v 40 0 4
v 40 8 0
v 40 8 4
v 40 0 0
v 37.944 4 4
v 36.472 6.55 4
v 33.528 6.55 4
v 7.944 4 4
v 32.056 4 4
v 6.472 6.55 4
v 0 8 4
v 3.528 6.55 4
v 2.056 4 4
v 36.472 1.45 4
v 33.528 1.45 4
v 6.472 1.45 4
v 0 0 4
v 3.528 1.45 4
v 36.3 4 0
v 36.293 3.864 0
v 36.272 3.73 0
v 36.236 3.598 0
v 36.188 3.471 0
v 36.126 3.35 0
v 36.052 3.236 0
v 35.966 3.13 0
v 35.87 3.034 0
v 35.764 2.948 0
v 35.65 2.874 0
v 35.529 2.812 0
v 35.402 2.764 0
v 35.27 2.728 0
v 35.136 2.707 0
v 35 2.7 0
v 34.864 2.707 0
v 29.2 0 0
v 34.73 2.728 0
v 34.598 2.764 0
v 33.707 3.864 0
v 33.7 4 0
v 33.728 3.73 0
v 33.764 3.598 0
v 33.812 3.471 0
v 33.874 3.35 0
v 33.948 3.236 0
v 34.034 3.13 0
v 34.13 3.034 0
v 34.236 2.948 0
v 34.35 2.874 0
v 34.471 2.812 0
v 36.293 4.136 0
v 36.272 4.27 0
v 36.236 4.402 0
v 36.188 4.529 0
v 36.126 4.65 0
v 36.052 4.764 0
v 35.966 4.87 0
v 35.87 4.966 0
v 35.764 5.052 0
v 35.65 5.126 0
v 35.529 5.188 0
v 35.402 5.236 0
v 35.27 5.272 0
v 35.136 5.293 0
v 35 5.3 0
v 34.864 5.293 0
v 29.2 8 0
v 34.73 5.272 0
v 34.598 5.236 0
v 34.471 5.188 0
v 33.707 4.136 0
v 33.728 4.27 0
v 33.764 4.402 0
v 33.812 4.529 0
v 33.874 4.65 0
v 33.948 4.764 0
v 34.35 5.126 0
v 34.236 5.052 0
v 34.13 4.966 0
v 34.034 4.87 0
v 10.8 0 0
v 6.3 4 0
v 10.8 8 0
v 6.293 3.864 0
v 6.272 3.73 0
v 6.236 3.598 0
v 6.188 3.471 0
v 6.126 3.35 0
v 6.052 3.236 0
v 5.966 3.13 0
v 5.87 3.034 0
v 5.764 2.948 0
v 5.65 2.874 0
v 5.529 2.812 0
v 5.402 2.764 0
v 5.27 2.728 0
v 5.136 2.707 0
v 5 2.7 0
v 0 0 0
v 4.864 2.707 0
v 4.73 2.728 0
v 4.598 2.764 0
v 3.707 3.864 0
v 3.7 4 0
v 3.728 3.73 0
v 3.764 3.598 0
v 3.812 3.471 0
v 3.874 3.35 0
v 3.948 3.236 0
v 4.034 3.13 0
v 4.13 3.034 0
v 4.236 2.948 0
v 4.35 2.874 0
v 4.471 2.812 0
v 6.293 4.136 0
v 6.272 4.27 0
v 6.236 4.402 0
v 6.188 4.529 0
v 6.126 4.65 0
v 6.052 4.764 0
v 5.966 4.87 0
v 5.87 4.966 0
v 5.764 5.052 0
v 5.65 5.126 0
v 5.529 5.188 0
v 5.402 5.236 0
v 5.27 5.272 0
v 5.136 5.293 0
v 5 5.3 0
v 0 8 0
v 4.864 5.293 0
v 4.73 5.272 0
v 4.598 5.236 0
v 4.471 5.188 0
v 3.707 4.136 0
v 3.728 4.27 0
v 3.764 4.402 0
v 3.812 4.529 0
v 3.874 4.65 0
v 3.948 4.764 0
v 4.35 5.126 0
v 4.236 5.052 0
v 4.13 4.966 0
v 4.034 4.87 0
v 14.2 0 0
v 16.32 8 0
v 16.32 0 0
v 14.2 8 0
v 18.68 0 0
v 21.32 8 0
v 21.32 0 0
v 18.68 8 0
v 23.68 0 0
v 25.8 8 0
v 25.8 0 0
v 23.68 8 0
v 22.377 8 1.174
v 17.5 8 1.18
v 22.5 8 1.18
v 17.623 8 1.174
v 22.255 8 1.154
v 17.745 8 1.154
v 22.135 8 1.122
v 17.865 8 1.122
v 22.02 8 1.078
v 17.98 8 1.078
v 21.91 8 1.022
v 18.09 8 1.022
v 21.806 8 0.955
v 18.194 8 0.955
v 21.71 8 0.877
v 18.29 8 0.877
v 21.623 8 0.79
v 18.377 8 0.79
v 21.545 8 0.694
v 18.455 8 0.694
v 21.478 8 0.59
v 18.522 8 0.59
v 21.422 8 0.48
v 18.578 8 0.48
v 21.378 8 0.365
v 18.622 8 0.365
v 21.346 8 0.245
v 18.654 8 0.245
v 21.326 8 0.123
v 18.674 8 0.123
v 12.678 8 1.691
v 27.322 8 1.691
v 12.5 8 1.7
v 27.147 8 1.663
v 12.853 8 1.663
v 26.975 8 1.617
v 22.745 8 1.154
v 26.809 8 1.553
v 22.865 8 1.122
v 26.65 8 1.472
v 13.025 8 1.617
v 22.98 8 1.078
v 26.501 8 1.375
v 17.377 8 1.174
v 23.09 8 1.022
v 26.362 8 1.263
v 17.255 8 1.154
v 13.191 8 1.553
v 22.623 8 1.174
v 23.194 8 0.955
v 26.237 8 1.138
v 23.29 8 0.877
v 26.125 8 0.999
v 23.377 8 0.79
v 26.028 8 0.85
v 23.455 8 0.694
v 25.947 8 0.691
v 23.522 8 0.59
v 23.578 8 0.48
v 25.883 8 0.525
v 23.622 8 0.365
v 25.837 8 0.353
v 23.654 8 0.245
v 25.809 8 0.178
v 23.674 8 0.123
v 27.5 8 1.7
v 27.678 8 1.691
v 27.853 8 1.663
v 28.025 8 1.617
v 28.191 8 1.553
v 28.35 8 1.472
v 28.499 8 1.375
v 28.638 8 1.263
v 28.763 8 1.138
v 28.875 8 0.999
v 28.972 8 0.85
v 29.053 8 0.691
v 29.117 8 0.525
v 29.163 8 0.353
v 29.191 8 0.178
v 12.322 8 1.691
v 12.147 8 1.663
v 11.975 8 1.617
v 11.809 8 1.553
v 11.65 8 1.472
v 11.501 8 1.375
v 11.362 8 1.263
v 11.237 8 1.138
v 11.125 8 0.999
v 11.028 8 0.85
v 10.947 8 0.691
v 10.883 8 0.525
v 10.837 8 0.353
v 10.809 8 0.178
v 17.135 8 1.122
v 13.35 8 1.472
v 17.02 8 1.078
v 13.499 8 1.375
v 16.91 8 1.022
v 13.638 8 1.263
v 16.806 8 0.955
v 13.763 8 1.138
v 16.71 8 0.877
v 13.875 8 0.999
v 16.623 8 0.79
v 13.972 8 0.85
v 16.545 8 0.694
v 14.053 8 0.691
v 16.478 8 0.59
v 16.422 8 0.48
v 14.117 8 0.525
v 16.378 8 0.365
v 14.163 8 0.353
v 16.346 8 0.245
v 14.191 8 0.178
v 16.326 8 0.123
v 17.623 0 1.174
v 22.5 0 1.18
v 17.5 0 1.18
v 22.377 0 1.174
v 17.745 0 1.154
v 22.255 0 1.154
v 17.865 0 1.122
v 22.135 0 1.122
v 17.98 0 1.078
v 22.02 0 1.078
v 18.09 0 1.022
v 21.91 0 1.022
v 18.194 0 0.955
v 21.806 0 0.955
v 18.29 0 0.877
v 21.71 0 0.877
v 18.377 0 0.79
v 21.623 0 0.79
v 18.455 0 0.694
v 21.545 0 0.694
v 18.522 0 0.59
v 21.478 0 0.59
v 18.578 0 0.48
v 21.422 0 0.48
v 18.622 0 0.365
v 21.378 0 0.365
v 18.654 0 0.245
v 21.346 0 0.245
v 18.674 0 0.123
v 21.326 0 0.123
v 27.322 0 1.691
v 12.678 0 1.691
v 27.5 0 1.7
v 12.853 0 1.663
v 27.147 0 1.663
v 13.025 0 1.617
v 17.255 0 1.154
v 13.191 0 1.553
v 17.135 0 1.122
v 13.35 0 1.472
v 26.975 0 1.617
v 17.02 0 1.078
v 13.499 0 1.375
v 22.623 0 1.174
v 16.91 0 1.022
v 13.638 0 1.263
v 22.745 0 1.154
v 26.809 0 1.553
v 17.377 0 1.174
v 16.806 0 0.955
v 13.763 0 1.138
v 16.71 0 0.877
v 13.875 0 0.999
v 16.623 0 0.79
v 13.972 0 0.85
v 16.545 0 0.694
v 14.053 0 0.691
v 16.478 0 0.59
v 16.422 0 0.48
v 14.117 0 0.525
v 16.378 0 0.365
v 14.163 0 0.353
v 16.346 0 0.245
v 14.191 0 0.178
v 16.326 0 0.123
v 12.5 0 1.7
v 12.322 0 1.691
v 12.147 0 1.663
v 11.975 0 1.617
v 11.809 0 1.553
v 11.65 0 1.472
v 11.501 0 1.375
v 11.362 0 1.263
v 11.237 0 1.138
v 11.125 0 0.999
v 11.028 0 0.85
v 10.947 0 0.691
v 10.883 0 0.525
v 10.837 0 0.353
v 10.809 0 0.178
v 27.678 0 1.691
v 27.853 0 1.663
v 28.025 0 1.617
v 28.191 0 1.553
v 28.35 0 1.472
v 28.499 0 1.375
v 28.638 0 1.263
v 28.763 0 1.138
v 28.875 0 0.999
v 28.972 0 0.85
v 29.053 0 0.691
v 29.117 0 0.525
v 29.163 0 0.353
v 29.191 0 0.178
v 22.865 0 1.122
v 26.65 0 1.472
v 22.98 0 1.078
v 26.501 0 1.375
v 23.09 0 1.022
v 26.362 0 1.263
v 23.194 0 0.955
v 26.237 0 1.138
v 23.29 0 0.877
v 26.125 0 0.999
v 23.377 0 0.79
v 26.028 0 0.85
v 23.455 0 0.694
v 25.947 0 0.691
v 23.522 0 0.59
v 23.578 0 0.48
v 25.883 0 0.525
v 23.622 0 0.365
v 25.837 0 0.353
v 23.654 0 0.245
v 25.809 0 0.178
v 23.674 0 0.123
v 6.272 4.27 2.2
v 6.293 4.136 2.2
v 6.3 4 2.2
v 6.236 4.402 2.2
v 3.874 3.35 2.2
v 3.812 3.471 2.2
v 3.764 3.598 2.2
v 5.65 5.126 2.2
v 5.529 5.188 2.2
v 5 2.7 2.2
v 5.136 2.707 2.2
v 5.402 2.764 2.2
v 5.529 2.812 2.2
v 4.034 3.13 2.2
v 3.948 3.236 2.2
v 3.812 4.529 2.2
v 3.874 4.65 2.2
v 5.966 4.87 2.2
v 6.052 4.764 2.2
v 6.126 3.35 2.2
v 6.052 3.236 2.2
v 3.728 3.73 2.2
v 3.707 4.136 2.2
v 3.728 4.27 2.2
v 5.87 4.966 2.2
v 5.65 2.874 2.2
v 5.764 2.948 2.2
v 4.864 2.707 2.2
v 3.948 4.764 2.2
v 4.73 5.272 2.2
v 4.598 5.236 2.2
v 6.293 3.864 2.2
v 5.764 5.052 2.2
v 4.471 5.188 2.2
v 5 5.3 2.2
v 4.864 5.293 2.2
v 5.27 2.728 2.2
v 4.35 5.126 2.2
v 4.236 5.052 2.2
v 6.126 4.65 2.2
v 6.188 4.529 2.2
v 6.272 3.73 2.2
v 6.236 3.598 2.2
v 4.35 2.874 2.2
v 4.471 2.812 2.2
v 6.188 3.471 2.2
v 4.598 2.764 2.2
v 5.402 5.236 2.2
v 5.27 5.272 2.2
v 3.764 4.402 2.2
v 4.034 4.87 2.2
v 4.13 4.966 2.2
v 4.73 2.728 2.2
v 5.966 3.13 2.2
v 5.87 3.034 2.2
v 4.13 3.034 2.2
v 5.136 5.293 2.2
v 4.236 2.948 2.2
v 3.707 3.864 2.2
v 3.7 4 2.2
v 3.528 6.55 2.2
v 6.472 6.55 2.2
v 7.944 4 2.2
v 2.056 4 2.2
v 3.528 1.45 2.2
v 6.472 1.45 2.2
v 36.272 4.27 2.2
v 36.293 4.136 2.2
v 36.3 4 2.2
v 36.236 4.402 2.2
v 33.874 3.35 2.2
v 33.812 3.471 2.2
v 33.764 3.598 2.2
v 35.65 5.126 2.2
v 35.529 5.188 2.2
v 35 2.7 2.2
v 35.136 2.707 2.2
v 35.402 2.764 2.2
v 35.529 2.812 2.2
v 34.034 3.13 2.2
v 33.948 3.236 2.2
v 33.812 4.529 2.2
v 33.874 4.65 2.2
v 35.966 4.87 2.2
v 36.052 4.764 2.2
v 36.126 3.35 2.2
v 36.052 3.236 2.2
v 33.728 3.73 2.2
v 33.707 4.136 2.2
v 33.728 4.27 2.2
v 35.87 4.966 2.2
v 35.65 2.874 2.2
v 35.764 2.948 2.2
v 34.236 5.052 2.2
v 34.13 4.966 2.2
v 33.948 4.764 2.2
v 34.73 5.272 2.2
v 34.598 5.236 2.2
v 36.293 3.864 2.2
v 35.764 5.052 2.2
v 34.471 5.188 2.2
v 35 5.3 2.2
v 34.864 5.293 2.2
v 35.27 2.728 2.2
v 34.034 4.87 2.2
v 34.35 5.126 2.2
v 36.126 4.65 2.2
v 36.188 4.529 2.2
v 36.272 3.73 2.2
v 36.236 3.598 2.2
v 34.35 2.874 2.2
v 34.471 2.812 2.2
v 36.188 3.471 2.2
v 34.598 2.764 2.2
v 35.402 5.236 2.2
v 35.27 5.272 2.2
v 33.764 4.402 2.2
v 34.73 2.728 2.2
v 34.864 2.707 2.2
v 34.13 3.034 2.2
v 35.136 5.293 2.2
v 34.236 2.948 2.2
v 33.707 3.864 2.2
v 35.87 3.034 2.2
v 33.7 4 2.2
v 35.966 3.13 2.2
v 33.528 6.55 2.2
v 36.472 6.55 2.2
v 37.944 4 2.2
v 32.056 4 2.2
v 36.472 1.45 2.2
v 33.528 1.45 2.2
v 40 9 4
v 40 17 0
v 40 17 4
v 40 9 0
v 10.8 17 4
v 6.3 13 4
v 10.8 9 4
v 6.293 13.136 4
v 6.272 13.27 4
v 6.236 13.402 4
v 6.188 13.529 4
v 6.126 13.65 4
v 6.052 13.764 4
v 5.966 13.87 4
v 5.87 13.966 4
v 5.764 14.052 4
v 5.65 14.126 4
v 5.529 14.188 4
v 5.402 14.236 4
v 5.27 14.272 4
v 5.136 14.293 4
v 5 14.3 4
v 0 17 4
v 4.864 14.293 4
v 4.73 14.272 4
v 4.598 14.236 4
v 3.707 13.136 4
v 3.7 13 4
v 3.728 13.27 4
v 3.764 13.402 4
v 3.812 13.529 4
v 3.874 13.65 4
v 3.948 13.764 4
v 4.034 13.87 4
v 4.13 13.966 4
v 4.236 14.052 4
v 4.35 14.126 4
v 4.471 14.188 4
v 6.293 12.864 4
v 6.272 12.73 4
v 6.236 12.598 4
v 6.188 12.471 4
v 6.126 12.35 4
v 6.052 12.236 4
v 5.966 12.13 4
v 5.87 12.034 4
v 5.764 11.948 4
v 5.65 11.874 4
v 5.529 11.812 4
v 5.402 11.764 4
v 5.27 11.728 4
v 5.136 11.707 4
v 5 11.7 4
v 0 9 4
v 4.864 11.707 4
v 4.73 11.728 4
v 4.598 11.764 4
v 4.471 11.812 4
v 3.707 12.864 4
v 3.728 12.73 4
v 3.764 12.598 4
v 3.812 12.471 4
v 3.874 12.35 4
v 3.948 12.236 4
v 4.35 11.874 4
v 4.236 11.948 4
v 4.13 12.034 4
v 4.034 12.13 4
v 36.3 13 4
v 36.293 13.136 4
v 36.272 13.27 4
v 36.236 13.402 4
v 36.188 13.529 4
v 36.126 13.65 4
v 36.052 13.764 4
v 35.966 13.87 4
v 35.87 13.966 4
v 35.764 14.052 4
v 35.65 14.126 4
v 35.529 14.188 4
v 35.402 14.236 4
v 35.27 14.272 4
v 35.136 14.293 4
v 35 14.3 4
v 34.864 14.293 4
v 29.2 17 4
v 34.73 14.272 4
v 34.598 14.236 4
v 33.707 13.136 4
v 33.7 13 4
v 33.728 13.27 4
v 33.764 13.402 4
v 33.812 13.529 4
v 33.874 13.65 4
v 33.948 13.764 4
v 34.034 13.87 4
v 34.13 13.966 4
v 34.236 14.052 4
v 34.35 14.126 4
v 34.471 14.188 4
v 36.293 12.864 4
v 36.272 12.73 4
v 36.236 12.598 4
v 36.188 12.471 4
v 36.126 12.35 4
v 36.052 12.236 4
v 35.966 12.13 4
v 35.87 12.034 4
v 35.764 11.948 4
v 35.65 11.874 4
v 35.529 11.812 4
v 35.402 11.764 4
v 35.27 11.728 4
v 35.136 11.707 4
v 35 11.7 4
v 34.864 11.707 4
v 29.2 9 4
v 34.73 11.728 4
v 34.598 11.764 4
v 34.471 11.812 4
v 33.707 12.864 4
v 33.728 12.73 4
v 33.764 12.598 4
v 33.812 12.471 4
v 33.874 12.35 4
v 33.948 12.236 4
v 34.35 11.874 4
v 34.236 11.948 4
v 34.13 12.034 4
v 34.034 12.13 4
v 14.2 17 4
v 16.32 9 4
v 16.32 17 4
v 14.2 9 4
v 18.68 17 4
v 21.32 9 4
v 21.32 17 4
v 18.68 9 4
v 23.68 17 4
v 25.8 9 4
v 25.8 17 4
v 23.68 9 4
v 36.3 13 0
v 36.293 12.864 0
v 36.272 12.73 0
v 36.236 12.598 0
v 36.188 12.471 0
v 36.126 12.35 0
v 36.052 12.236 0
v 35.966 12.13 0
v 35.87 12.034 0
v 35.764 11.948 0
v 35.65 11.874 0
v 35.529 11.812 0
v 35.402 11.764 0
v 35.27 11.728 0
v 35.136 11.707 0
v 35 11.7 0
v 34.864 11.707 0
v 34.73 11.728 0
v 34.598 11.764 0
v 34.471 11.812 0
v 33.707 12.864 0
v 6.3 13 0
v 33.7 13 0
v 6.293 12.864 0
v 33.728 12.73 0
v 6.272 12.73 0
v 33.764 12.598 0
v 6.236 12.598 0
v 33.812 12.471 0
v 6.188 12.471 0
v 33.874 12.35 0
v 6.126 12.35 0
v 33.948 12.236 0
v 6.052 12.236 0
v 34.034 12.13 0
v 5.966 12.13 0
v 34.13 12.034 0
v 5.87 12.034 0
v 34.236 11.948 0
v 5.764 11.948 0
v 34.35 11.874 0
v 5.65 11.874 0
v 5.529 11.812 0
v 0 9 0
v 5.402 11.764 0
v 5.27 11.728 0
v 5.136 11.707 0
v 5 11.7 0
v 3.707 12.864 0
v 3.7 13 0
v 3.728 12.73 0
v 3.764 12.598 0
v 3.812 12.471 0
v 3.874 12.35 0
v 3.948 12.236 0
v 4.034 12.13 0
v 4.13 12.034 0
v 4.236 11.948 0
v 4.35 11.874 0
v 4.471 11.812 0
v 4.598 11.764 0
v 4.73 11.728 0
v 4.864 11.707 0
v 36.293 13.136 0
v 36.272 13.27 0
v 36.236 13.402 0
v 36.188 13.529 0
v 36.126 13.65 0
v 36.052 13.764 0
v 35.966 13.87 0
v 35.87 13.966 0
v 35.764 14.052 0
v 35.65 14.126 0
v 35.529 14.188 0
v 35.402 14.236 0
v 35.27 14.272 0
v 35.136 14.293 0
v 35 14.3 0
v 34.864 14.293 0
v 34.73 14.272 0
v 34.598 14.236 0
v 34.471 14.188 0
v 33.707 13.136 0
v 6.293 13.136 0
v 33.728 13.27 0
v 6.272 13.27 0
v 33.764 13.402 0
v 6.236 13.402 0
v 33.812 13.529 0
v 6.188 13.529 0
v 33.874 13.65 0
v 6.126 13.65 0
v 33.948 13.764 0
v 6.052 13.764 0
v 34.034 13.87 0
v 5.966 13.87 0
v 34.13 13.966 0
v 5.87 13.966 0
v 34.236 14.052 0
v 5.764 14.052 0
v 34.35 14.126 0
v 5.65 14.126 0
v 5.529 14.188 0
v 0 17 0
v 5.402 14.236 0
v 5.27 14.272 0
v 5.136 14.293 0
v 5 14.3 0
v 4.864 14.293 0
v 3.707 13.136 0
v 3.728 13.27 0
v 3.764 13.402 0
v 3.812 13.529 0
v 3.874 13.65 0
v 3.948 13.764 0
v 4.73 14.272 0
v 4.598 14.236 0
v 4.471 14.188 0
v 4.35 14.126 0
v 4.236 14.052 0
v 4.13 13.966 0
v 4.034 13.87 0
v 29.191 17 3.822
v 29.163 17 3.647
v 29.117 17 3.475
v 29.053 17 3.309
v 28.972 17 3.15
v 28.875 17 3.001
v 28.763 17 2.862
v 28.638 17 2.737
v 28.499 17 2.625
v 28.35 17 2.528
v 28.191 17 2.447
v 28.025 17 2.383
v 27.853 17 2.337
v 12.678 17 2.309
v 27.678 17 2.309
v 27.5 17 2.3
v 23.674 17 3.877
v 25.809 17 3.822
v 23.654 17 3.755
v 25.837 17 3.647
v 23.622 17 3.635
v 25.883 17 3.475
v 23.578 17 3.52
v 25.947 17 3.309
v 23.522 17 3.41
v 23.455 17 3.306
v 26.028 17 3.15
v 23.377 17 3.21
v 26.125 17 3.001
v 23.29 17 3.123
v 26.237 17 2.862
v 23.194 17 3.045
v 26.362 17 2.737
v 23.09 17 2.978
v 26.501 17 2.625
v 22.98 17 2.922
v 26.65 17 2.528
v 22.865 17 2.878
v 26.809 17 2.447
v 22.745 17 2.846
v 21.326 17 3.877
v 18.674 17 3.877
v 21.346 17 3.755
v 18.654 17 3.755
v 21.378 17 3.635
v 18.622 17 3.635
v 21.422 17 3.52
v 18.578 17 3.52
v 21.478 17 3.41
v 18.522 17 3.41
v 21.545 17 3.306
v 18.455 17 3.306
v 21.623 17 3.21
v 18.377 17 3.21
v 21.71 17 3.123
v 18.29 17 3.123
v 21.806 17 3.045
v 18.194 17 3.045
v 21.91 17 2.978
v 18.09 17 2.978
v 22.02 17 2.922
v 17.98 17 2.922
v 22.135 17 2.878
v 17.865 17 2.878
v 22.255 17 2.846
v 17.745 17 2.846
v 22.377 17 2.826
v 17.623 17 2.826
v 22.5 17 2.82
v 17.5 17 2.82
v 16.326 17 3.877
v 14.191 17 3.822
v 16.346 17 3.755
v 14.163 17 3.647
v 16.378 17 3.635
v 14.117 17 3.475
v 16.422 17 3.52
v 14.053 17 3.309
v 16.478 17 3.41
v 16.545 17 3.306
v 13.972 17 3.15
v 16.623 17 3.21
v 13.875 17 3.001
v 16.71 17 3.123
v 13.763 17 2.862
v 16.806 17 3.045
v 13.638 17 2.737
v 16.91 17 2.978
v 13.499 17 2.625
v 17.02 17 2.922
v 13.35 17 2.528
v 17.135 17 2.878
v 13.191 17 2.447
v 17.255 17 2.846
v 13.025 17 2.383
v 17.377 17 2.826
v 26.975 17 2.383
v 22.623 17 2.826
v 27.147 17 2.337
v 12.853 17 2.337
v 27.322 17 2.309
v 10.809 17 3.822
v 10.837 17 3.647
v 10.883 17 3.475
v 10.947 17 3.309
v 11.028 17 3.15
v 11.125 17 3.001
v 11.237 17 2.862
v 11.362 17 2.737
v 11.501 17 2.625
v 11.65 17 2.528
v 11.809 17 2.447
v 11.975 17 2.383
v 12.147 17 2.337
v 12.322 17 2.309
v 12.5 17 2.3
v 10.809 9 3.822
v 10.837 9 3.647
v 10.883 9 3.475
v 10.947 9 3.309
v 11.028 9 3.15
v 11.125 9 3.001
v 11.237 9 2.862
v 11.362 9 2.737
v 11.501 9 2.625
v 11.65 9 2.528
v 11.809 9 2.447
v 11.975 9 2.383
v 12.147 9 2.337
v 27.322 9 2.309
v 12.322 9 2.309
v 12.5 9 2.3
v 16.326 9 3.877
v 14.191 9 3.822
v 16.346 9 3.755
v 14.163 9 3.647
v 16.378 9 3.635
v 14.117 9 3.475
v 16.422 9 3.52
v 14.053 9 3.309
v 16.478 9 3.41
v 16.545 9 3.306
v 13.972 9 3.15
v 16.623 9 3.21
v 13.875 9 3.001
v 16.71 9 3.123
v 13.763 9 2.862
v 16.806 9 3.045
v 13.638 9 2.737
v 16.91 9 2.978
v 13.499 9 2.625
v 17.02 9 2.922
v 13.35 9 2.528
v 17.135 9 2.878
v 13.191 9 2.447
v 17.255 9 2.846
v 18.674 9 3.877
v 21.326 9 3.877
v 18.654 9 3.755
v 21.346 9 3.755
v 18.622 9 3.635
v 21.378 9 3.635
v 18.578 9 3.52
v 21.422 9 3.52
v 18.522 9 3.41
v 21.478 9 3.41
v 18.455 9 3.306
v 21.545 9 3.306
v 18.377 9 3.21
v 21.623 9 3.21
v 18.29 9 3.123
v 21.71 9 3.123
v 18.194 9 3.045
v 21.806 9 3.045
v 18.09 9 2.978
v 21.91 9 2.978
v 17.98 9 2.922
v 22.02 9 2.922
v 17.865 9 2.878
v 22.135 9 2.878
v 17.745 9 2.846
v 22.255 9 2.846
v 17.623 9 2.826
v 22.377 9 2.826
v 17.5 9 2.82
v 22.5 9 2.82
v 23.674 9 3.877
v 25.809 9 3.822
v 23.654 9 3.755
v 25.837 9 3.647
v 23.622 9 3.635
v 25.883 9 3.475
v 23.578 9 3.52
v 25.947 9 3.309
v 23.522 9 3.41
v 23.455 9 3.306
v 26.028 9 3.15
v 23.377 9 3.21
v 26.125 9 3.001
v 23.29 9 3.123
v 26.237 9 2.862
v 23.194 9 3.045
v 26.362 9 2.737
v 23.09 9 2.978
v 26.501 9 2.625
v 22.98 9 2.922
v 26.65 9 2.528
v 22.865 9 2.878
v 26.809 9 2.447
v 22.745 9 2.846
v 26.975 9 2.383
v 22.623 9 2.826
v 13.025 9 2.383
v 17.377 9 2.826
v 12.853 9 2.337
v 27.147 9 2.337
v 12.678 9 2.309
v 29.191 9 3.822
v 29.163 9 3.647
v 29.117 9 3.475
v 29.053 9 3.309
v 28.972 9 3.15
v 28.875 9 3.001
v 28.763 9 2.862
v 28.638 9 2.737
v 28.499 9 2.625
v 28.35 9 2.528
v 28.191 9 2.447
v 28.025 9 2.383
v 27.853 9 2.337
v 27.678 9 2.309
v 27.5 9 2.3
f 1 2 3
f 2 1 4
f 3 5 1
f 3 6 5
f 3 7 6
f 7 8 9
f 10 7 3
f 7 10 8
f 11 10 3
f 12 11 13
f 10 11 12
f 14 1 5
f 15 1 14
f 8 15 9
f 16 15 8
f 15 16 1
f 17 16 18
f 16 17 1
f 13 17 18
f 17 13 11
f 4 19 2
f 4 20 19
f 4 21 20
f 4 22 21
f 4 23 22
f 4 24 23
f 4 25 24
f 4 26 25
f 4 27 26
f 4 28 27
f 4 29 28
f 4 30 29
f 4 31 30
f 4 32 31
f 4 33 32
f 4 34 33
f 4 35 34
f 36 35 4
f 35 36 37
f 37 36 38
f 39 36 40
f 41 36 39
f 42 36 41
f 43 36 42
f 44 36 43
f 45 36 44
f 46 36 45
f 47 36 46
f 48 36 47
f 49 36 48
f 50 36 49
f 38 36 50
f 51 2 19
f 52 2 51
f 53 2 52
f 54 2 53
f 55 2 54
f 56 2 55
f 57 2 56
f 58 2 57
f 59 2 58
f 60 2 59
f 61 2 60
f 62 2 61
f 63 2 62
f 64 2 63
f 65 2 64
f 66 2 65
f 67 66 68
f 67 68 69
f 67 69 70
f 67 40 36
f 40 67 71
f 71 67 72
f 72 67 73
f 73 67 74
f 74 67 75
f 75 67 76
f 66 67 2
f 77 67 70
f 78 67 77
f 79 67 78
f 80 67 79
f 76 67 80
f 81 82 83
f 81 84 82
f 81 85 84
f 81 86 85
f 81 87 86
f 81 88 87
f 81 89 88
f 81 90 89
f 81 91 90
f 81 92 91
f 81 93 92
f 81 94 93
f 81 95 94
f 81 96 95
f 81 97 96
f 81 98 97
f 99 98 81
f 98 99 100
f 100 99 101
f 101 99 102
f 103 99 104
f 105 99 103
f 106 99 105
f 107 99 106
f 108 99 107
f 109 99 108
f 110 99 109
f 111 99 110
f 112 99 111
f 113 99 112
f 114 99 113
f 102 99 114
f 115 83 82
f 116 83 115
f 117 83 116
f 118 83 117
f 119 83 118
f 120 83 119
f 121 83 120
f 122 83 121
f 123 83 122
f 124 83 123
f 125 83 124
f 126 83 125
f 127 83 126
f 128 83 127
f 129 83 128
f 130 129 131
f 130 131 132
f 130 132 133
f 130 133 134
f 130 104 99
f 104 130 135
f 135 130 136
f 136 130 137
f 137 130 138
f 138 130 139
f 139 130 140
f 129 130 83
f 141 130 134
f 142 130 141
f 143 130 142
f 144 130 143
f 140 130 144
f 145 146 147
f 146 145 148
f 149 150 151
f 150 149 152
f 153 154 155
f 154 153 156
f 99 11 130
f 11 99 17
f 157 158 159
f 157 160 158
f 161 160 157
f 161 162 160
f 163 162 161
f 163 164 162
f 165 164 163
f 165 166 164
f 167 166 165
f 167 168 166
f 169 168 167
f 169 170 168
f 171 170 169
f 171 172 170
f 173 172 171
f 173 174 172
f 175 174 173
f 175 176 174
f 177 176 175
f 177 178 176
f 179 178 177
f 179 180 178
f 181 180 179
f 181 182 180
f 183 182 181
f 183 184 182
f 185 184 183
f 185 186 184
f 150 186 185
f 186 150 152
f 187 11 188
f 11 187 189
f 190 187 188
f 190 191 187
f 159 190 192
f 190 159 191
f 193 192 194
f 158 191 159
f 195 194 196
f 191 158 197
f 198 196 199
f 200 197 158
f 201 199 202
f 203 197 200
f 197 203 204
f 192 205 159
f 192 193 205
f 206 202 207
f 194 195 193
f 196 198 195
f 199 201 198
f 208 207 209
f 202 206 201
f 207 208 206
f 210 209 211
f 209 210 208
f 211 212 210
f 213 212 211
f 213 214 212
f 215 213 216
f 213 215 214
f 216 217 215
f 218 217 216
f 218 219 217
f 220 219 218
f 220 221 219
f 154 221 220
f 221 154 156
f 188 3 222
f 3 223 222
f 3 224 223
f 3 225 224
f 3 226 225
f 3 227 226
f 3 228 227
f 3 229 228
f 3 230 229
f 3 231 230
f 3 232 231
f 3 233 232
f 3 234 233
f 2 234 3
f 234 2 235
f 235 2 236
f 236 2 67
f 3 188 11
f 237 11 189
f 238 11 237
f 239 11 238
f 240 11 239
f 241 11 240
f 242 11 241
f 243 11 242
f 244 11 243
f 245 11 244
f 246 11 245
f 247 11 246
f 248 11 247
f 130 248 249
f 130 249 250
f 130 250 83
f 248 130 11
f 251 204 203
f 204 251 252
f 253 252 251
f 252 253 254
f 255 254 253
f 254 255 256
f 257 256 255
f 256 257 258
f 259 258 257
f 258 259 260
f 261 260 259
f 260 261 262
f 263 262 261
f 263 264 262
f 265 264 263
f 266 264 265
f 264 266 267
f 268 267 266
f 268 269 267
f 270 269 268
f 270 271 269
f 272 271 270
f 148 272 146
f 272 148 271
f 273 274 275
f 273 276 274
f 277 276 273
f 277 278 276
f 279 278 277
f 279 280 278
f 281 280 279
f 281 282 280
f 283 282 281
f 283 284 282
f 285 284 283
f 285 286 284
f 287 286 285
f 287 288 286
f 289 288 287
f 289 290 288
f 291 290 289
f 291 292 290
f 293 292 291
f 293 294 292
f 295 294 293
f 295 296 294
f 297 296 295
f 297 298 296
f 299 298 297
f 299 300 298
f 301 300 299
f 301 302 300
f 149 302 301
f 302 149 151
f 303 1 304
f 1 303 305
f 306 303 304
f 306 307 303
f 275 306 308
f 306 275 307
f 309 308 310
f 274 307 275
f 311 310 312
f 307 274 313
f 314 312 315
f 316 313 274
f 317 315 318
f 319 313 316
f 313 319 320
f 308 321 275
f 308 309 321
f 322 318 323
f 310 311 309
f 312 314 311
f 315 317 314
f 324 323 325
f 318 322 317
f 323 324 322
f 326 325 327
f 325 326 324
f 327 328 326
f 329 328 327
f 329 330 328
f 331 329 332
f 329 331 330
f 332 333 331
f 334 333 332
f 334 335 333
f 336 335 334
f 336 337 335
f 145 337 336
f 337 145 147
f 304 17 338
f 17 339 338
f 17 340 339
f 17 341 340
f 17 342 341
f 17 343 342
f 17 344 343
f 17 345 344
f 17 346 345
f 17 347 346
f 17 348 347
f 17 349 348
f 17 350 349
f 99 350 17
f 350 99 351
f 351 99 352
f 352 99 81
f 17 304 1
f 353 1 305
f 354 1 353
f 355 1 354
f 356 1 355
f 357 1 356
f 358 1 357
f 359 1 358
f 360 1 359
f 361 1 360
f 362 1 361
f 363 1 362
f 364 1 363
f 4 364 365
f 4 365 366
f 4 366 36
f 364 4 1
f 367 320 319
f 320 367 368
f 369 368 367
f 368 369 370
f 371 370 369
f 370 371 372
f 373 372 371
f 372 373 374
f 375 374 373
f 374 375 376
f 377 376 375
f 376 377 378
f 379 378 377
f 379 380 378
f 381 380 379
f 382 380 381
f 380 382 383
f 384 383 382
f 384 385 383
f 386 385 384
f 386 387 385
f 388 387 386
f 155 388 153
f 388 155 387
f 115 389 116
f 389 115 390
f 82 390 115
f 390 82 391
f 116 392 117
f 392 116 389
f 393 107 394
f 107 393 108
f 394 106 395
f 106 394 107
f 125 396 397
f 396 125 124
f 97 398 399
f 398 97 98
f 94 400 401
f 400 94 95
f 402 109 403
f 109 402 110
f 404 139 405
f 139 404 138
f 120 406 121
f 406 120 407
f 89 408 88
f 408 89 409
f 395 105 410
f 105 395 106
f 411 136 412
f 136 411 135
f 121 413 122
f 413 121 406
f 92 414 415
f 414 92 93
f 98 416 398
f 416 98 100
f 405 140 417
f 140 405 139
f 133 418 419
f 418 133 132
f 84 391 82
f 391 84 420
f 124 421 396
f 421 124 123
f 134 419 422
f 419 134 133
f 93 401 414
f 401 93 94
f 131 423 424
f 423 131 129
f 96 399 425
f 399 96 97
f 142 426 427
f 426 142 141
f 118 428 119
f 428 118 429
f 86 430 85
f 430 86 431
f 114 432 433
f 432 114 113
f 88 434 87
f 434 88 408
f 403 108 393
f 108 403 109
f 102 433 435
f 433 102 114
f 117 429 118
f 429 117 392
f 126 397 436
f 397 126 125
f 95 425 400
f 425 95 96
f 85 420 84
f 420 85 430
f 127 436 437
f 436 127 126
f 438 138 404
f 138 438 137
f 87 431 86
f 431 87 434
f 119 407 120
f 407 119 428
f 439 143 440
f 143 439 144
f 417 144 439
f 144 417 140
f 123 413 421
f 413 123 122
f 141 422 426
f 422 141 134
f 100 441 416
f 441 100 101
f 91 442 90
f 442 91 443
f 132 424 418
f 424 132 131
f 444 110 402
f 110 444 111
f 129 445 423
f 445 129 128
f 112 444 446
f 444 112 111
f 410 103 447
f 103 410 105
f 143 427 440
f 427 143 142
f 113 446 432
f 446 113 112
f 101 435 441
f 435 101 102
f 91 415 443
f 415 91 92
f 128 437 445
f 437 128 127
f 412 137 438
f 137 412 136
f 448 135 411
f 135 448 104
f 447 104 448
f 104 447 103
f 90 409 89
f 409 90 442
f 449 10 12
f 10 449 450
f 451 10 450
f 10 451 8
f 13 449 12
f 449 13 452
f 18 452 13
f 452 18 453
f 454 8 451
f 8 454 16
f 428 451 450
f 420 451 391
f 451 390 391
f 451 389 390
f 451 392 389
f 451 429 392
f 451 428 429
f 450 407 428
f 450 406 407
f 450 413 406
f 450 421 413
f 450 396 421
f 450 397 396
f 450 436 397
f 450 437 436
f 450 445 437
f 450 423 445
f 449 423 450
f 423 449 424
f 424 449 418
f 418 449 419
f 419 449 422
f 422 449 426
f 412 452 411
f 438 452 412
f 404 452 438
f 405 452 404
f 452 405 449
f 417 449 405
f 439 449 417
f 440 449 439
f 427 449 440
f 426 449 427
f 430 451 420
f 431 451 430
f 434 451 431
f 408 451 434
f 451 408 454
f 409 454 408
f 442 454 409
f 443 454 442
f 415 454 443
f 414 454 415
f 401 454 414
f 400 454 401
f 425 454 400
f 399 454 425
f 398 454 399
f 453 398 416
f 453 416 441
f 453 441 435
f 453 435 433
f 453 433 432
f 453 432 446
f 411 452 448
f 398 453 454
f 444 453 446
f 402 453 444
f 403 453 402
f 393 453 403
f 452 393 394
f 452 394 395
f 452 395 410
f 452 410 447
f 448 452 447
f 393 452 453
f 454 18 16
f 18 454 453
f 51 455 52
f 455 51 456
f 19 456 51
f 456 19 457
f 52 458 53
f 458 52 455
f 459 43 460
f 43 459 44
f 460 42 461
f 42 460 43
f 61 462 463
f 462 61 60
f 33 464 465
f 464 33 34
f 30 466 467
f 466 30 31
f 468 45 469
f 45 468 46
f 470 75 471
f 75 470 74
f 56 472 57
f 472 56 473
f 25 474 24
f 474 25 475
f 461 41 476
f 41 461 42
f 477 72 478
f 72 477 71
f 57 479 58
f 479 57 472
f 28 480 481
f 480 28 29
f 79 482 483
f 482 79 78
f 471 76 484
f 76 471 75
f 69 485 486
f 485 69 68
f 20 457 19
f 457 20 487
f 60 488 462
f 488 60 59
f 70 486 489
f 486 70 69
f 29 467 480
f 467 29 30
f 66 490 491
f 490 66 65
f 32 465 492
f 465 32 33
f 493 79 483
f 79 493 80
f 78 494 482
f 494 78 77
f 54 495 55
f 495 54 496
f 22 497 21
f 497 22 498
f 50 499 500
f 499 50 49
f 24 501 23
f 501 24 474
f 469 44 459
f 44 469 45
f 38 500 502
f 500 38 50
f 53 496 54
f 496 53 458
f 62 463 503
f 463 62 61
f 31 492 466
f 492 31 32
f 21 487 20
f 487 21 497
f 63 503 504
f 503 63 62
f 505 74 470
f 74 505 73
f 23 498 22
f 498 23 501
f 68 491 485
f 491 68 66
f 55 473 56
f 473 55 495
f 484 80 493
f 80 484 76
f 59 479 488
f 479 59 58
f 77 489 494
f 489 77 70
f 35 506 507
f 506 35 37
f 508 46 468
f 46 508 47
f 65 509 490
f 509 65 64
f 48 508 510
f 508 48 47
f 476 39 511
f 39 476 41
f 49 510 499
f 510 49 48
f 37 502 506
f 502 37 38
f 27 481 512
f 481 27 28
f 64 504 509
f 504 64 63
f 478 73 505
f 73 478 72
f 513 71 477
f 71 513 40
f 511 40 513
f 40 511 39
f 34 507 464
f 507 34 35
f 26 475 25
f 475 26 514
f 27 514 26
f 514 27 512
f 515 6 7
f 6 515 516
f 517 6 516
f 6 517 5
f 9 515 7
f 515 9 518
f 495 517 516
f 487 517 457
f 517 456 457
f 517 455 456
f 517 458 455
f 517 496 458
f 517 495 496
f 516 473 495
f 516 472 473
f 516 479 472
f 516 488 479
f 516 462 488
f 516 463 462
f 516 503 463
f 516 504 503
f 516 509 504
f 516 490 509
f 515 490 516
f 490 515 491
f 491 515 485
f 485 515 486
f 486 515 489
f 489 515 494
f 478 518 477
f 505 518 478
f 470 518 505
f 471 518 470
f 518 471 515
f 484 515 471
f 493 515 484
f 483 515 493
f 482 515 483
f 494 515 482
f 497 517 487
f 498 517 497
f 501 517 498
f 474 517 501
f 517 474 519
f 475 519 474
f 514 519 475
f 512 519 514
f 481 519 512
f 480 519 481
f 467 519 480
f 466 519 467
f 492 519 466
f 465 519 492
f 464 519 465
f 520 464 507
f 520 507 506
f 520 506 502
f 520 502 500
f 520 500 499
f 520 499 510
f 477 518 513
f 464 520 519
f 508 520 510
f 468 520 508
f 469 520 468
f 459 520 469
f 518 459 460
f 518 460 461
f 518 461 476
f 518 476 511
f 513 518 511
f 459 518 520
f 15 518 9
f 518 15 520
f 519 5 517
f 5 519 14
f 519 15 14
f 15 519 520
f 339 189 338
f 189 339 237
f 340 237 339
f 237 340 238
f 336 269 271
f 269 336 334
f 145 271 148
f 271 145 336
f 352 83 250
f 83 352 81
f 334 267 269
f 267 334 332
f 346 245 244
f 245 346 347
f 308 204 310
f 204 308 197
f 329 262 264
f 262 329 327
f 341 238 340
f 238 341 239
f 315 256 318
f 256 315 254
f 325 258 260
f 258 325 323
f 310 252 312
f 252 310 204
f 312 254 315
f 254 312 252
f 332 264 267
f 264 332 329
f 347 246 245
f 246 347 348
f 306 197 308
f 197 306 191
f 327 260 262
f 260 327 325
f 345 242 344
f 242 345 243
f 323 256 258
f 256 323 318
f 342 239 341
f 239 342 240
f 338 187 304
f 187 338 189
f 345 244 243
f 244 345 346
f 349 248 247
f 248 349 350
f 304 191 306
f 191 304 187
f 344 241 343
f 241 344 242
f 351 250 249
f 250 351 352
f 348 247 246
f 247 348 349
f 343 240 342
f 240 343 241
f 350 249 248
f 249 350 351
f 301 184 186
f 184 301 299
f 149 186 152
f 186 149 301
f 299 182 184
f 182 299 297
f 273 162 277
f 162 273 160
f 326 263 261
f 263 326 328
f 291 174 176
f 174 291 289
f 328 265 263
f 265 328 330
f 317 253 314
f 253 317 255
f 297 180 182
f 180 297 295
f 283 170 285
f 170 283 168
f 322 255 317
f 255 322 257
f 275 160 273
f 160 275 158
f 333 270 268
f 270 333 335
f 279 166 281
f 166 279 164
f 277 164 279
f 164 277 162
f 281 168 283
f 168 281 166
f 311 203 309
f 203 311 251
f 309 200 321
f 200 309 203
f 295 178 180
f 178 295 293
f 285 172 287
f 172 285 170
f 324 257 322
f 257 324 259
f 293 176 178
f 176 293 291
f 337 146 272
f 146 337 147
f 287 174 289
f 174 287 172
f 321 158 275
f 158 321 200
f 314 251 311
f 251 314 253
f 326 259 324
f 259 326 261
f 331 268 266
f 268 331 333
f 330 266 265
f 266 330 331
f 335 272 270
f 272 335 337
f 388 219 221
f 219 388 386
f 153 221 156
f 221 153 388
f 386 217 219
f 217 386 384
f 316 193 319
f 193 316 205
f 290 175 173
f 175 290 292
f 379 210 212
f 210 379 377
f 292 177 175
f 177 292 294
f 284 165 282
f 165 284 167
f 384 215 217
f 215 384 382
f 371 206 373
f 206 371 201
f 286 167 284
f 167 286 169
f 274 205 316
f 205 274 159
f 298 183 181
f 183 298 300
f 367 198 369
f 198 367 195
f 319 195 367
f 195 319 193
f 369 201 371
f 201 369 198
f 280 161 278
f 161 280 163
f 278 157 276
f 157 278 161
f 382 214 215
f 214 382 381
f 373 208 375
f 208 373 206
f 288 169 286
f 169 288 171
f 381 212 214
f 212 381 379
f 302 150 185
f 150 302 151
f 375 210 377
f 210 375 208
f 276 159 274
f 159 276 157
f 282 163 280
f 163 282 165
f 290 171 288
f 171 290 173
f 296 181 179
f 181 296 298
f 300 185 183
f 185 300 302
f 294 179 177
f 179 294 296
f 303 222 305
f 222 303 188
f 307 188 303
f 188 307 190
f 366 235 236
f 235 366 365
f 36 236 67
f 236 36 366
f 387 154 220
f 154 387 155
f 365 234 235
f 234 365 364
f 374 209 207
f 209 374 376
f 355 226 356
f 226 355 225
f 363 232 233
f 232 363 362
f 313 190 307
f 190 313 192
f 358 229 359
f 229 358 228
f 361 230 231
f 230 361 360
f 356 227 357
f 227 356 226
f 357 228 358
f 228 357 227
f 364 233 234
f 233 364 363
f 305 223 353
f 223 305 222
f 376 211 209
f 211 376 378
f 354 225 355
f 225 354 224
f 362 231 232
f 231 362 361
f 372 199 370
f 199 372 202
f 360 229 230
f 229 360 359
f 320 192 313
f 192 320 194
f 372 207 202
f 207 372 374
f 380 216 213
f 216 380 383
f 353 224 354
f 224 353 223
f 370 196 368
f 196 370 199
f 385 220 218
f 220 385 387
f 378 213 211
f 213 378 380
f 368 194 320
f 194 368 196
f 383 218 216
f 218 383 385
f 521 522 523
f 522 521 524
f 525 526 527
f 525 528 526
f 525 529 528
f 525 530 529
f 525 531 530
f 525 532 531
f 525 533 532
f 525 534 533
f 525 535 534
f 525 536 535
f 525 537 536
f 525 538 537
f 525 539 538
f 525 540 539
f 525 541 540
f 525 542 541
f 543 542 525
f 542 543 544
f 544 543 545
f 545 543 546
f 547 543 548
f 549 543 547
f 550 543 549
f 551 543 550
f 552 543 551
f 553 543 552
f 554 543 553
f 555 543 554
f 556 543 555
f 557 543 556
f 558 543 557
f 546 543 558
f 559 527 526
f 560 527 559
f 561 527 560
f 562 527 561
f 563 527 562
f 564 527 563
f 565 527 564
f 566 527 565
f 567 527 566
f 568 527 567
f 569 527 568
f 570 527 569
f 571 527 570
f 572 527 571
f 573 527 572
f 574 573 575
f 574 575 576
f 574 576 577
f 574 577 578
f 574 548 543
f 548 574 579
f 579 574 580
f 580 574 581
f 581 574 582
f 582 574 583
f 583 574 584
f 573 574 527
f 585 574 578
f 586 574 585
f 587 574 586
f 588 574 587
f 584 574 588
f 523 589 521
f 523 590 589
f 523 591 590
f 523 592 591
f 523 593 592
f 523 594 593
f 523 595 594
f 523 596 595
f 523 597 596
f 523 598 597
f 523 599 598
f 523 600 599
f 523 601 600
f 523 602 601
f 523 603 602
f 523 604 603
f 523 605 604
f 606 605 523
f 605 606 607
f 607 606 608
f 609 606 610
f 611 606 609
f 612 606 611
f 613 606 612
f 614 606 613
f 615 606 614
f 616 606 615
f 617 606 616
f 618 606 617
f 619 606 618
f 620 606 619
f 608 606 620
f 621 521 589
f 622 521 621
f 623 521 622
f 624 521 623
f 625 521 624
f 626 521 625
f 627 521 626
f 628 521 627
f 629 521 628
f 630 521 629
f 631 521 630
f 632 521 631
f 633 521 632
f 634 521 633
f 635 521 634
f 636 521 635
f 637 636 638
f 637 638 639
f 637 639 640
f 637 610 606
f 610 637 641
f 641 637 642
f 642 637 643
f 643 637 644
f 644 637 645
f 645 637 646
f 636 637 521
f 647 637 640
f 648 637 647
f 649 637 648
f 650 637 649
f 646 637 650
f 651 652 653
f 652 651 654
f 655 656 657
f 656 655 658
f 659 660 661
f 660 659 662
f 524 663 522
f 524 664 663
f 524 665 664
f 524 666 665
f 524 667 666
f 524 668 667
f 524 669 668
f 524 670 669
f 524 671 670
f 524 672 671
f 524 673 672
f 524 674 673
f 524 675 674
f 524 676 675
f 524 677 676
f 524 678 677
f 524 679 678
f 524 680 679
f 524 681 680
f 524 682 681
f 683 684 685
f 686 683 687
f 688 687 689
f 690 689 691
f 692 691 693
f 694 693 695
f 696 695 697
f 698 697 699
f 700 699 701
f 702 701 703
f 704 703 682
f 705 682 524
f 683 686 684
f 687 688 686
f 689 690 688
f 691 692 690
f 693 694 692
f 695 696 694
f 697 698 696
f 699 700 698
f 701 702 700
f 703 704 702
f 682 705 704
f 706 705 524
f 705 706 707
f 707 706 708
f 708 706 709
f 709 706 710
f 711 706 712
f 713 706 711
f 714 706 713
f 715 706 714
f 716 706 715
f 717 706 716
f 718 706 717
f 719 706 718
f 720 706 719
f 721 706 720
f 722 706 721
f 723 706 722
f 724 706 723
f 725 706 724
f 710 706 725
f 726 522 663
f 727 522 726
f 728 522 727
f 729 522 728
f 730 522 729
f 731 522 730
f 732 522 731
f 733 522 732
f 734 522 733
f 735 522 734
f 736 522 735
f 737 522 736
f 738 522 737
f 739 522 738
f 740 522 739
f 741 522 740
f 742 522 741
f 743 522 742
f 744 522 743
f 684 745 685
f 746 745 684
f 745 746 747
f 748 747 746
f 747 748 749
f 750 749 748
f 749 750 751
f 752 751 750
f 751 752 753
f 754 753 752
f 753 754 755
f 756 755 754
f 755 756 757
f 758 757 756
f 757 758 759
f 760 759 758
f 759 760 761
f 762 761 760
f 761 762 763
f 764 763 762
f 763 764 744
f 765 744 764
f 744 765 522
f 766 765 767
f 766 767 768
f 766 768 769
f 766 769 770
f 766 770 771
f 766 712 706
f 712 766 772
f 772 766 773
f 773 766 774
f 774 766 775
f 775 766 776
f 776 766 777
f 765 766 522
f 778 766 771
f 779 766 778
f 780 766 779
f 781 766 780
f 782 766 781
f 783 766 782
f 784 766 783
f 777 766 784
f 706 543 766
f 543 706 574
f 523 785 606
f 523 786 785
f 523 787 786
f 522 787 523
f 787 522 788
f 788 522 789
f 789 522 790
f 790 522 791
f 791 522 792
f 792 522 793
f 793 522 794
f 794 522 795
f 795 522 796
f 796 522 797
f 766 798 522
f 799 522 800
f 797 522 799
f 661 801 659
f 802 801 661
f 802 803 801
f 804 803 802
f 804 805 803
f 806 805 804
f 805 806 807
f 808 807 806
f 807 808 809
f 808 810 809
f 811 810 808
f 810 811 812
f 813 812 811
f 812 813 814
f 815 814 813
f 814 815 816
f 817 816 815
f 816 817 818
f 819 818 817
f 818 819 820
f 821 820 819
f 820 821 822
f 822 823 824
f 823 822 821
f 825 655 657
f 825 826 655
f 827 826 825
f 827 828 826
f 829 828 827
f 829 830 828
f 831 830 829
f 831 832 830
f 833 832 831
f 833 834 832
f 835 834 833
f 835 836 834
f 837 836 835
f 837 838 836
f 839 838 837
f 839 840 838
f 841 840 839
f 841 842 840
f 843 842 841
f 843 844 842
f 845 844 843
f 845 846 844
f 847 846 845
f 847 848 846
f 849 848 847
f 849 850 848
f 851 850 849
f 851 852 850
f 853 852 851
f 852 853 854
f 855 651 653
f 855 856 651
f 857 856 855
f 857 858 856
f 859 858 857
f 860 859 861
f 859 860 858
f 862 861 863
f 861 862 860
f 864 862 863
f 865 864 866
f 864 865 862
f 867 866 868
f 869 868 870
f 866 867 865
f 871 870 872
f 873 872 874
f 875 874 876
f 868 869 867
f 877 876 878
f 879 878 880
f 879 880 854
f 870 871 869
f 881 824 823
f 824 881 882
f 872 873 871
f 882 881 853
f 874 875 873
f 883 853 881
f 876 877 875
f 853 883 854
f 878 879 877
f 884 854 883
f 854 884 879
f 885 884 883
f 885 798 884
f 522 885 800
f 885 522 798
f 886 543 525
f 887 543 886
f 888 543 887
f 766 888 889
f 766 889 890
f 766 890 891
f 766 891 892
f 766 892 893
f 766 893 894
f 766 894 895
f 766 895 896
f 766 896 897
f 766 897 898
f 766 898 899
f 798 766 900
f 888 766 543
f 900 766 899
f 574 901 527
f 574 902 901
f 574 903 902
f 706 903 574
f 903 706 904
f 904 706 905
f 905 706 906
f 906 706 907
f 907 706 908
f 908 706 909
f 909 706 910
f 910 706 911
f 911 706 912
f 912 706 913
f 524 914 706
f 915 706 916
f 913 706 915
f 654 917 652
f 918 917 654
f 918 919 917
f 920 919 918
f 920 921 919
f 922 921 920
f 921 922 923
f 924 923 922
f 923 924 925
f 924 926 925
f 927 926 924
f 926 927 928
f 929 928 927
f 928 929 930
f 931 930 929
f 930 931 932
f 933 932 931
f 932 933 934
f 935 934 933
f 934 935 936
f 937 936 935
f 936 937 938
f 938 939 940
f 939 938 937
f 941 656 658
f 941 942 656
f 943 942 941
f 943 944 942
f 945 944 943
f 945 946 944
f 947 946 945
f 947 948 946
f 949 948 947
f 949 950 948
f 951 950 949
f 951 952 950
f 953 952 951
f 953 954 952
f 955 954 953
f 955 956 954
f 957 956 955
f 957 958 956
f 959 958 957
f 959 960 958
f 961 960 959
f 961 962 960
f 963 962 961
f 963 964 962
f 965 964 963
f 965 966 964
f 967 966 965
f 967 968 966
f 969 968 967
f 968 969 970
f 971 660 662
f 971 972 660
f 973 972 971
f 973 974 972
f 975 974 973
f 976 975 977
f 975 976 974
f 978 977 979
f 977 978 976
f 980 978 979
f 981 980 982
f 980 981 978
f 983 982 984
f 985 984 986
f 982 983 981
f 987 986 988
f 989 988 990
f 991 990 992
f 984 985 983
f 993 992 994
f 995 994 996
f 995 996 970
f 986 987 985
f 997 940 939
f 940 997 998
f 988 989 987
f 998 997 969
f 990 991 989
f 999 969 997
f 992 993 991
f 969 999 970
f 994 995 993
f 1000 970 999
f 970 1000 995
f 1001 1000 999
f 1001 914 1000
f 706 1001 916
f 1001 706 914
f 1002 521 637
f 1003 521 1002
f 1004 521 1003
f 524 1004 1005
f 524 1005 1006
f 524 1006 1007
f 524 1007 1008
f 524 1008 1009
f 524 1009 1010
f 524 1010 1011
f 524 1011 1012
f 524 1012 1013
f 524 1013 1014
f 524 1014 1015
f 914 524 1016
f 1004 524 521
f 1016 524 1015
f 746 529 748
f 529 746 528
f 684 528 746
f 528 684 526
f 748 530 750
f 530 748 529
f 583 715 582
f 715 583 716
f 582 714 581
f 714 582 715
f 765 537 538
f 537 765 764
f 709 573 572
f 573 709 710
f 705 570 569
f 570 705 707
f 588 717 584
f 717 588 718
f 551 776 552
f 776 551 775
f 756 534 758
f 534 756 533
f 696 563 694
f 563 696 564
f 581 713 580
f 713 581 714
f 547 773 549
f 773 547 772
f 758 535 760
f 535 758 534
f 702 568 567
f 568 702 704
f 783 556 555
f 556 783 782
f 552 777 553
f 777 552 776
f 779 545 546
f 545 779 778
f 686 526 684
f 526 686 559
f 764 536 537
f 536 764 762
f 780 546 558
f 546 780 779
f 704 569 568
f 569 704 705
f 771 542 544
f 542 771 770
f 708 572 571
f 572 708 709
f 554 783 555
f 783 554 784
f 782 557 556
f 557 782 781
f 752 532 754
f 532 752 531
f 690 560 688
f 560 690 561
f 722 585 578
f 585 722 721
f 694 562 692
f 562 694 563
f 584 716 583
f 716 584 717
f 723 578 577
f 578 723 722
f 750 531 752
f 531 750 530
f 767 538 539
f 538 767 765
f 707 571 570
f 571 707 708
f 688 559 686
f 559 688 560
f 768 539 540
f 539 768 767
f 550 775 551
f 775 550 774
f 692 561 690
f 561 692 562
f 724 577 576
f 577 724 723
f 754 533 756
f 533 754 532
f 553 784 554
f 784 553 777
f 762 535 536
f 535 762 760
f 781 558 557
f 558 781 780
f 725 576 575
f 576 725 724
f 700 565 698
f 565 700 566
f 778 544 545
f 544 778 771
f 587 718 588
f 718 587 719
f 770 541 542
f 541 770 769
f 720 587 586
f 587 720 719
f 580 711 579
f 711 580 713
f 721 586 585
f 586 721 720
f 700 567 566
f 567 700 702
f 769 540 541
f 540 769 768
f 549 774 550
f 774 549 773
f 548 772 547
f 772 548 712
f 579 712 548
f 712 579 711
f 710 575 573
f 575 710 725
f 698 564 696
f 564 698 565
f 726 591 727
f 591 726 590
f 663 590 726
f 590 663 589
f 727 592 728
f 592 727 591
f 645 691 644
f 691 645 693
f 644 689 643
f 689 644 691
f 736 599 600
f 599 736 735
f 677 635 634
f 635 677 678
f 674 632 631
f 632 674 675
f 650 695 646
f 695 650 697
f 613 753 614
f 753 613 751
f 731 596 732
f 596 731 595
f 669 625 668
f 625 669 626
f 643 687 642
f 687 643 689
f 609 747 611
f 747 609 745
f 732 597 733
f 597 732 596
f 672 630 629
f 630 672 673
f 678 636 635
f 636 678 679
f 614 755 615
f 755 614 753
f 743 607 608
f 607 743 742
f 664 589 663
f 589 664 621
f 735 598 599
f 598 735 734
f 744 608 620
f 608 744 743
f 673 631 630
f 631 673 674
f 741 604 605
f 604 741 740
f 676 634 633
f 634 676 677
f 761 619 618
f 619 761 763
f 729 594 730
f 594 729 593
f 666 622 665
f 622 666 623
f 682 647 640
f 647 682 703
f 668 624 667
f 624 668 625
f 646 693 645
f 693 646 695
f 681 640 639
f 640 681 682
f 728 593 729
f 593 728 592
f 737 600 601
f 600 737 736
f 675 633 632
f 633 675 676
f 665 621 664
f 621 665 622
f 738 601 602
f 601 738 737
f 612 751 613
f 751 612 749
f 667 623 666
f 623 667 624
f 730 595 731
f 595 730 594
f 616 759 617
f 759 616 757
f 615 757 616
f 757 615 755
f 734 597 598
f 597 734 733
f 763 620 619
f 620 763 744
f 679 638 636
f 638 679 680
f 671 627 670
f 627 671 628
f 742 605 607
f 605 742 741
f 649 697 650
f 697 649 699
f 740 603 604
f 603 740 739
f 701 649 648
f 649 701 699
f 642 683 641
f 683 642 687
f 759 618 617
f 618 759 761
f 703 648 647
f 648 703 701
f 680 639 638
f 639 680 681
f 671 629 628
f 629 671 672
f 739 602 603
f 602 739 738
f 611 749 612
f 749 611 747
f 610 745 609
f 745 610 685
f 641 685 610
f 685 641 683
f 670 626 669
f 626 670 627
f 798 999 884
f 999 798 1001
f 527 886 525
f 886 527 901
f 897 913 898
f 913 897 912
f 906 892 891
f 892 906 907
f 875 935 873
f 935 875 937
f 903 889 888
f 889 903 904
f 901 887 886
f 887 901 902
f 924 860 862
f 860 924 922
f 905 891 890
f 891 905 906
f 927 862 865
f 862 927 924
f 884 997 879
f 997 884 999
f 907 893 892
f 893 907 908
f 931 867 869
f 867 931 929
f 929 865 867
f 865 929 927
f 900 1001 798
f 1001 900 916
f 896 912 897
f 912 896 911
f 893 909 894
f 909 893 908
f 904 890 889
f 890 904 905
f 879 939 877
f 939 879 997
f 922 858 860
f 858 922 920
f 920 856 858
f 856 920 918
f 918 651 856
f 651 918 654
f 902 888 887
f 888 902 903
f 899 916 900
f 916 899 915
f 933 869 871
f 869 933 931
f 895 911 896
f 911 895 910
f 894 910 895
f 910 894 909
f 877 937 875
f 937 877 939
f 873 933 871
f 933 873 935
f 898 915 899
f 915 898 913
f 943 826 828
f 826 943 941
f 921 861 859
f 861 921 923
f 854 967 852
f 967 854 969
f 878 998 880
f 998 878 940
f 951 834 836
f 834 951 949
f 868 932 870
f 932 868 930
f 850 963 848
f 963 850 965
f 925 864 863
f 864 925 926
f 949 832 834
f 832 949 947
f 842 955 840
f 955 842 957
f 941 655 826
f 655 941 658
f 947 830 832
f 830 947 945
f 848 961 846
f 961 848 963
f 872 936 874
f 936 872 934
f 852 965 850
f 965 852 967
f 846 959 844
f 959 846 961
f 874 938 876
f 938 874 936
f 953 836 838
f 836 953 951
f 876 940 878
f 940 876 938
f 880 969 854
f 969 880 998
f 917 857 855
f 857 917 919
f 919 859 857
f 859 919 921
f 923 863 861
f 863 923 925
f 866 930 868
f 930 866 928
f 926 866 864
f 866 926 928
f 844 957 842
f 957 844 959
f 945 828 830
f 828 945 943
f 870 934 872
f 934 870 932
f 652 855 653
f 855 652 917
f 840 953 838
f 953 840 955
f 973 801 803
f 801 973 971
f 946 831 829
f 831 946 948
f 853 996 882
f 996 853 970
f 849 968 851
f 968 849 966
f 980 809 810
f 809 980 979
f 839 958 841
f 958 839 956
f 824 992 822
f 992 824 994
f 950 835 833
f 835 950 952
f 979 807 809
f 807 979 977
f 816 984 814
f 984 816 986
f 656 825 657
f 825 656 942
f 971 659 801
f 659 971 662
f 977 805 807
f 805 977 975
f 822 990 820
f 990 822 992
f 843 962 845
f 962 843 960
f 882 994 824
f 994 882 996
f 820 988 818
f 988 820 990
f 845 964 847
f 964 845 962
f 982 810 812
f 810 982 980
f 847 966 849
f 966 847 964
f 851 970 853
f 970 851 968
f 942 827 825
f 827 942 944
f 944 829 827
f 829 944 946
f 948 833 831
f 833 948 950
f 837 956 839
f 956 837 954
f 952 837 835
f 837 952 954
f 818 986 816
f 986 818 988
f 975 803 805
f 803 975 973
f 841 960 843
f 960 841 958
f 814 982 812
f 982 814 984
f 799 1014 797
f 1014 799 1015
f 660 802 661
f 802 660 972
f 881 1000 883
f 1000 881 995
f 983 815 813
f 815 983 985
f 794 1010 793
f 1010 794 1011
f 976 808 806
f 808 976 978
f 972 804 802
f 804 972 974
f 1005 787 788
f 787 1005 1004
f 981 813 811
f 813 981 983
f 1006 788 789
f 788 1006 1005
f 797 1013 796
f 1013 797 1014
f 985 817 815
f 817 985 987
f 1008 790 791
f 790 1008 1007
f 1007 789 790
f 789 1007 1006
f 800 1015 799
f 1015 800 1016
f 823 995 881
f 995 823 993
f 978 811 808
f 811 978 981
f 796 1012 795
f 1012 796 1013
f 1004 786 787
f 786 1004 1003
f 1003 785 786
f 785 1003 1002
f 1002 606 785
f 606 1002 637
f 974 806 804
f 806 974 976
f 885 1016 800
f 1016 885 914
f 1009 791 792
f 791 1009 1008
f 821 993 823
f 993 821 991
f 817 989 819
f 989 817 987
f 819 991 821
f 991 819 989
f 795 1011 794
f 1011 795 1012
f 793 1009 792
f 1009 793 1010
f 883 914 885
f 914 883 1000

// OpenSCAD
// Copyright 2023 Heikki Suonsivu
// Licensed under Creative Commons CC-BY-NC-SA, see https://creativecommons.org/licenses/by-nc-sa/4.0/
// For commercial licensing, please contact directly, hsu-3d@suonsivu.net, +358 40 551 9679

pitch=5;
hole1=3.4;
hole2=2.36;
hole3=2.36;
hole4=3.4;
holepositionx=10+pitch/2;
ruuvireika=2.6;
mutterisyvennys=5.1;
mutterithickness=1.8;

depth=8;
thickness=8;
width=pitch*4+20;
ruuvireika1x=5;
ruuvireika2x=width-5;

difference() {
  cube([width,depth,thickness/2]);
  translate([ruuvireika1x,depth/2,-0.01]) cylinder(h=thickness+1,d=ruuvireika,$fn=60);
  translate([ruuvireika1x+0,depth/2,thickness/2-mutterithickness]) cylinder(h=mutterithickness+1,d=mutterisyvennys/cos(180/6),$fn=6);
  translate([ruuvireika2x,depth/2,-0.01]) cylinder(h=thickness+1,d=ruuvireika,$fn=60);
  translate([ruuvireika2x+0,depth/2,thickness/2-mutterithickness]) cylinder(h=mutterithickness+1,d=mutterisyvennys/cos(180/6),$fn=6);
  rotate(a=[90,0,0]) translate([holepositionx+0*pitch,0,-depth-0.01]) cylinder(h=depth+1,d=hole1,$fn=60);
  rotate(a=[90,0,0]) translate([holepositionx+1*pitch,0,-depth-0.01]) cylinder(h=depth+1,d=hole2,$fn=60);
  rotate(a=[90,0,0]) translate([holepositionx+2*pitch,0,-depth-0.01]) cylinder(h=depth+1,d=hole2,$fn=60);
  rotate(a=[90,0,0]) translate([holepositionx+3*pitch,0,-depth-0.01]) cylinder(h=depth+1,d=hole1,$fn=60);
}

translate([0,depth+1,0]) difference() {
  cube([width,depth,thickness/2]);
  translate([ruuvireika1x,depth/2,-0.01]) cylinder(h=thickness+1,d=ruuvireika,$fn=60);
  translate([ruuvireika2x,depth/2,-0.01]) cylinder(h=thickness+1,d=ruuvireika,$fn=60);
  rotate(a=[90,0,0]) translate([holepositionx+0*pitch,thickness/2,-depth-0.01]) cylinder(h=depth+1,d=hole1,$fn=60);
  rotate(a=[90,0,0]) translate([holepositionx+1*pitch,thickness/2,-depth-0.01]) cylinder(h=depth+1,d=hole2,$fn=60);
  rotate(a=[90,0,0]) translate([holepositionx+2*pitch,thickness/2,-depth-0.01]) cylinder(h=depth+1,d=hole2,$fn=60);
  rotate(a=[90,0,0]) translate([holepositionx+3*pitch,thickness/2,-depth-0.01]) cylinder(h=depth+1,d=hole1,$fn=60);
}
